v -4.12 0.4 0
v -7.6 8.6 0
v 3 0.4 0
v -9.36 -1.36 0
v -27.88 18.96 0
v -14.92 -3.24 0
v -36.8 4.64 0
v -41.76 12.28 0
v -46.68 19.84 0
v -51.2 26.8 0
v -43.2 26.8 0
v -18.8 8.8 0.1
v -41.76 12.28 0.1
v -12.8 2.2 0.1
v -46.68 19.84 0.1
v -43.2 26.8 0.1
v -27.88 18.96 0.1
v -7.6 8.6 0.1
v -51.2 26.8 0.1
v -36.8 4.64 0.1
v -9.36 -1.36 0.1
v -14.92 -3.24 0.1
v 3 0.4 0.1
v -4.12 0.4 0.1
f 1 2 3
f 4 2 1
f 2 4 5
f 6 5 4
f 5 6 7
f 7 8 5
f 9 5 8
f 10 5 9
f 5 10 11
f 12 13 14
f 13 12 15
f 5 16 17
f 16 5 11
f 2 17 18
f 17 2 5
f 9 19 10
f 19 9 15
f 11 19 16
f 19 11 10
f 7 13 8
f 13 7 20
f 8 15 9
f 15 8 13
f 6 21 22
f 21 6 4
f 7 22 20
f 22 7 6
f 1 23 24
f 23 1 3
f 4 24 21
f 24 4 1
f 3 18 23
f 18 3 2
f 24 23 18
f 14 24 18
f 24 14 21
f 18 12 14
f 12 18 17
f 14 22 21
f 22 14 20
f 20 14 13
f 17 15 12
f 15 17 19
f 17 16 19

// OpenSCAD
// file: 164325d.scad
use <../lib.scad>
function ldraw_lib__164325d() = [
// 0 Sticker  3.8 x  6.8 Tail Plane with Emirates Airlines Logo Left
// 0 Name: 164325d.dat
// 0 Author: Takeshi Takahashi [RainbowDolphin]
// 0 !LDRAW_ORG Part UPDATE 2025-07
// 0 !LICENSE Licensed under CC BY 4.0 : see CAreadme.txt
// 
// 0 BFC CERTIFY CCW
  [0,"BFC","CERTIFY"],
  [0,"BFC","CCW"],
// 
// 0 !KEYWORDS Airliner, Bricklink 1973stk01, Brickowl 949698, Plane
// 0 !KEYWORDS Rebrickable 164325, Set 1973
// 
// 0 !HISTORY 2023-12-31 [OrionP] Official Update 2023-07
// 0 !HISTORY 2025-07-27 [OrionP] Minor header edits
// 0 !HISTORY 2025-07-27 [OrionP] Official Update 2025-07
// 
// 
// 3 16 -7.5 0 1 19 0 21.5 10.3 0 1
  [3,16,-7.5,0,1,19,0,21.5,10.3,0,1],
// 4 16 23.4 0 -3.4 10.3 0 1 19 0 21.5 69.7 0 47.4
  [4,16,23.4,0,-3.4,10.3,0,1,19,0,21.5,69.7,0,47.4],
// 4 16 37.3 0 -8.1 23.4 0 -3.4 69.7 0 47.4 92 0 11.6
  [4,16,37.3,0,-8.1,23.4,0,-3.4,69.7,0,47.4,92,0,11.6],
// 3 16 69.7 0 47.4 104.4 0 30.7 92 0 11.6
  [3,16,69.7,0,47.4,104.4,0,30.7,92,0,11.6],
// 3 16 104.4 0 30.7 69.7 0 47.4 116.7 0 49.6
  [3,16,104.4,0,30.7,69.7,0,47.4,116.7,0,49.6],
// 3 16 116.7 0 49.6 69.7 0 47.4 128 0 67
  [3,16,116.7,0,49.6,69.7,0,47.4,128,0,67],
// 3 16 108 0 67 128 0 67 69.7 0 47.4
  [3,16,108,0,67,128,0,67,69.7,0,47.4],
// 4 16 47 -.25 22 32 -.25 5.5 104.4 -.25 30.7 116.7 -.25 49.6
  [4,16,47,-.25,22,32,-.25,5.5,104.4,-.25,30.7,116.7,-.25,49.6],
// 4 16 108 -.25 67 108 0 67 69.7 0 47.4 69.7 -.25 47.4
  [4,16,108,-.25,67,108,0,67,69.7,0,47.4,69.7,-.25,47.4],
// 4 16 69.7 -.25 47.4 69.7 0 47.4 19 0 21.5 19 -.25 21.5
  [4,16,69.7,-.25,47.4,69.7,0,47.4,19,0,21.5,19,-.25,21.5],
// 4 16 116.7 -.25 49.6 116.7 0 49.6 128 0 67 128 -.25 67
  [4,16,116.7,-.25,49.6,116.7,0,49.6,128,0,67,128,-.25,67],
// 4 16 128 -.25 67 128 0 67 108 0 67 108 -.25 67
  [4,16,128,-.25,67,128,0,67,108,0,67,108,-.25,67],
// 4 16 92 -.25 11.6 92 0 11.6 104.4 0 30.7 104.4 -.25 30.7
  [4,16,92,-.25,11.6,92,0,11.6,104.4,0,30.7,104.4,-.25,30.7],
// 4 16 104.4 -.25 30.7 104.4 0 30.7 116.7 0 49.6 116.7 -.25 49.6
  [4,16,104.4,-.25,30.7,104.4,0,30.7,116.7,0,49.6,116.7,-.25,49.6],
// 4 16 23.4 -.25 -3.4 23.4 0 -3.4 37.3 0 -8.1 37.3 -.25 -8.1
  [4,16,23.4,-.25,-3.4,23.4,0,-3.4,37.3,0,-8.1,37.3,-.25,-8.1],
// 4 16 37.3 -.25 -8.1 37.3 0 -8.1 92 0 11.6 92 -.25 11.6
  [4,16,37.3,-.25,-8.1,37.3,0,-8.1,92,0,11.6,92,-.25,11.6],
// 4 16 -7.5 -.25 1 -7.5 0 1 10.3 0 1 10.3 -.25 1
  [4,16,-7.5,-.25,1,-7.5,0,1,10.3,0,1,10.3,-.25,1],
// 4 16 10.3 -.25 1 10.3 0 1 23.4 0 -3.4 23.4 -.25 -3.4
  [4,16,10.3,-.25,1,10.3,0,1,23.4,0,-3.4,23.4,-.25,-3.4],
// 4 16 19 -.25 21.5 19 0 21.5 -7.5 0 1 -7.5 -.25 1
  [4,16,19,-.25,21.5,19,0,21.5,-7.5,0,1,-7.5,-.25,1],
// 0 BFC NOCLIP
  [0,"BFC","NOCLIP"],
// 3 4 19 -.25 21.5 -7.5 -.25 1 10.3 -.25 1
  [3,4,19,-.25,21.5,-7.5,-.25,1,10.3,-.25,1],
// 4 4 19 -.25 21.5 10.3 -.25 1 23.4 -.25 -3.4 32 -.25 5.5
  [4,4,19,-.25,21.5,10.3,-.25,1,23.4,-.25,-3.4,32,-.25,5.5],
// 4 4 19 -.25 21.5 32 -.25 5.5 47 -.25 22 69.7 -.25 47.4
  [4,4,19,-.25,21.5,32,-.25,5.5,47,-.25,22,69.7,-.25,47.4],
// 4 0 32 -.25 5.5 23.4 -.25 -3.4 37.3 -.25 -8.1 92 -.25 11.6
  [4,0,32,-.25,5.5,23.4,-.25,-3.4,37.3,-.25,-8.1,92,-.25,11.6],
// 3 0 104.4 -.25 30.7 32 -.25 5.5 92 -.25 11.6
  [3,0,104.4,-.25,30.7,32,-.25,5.5,92,-.25,11.6],
// 4 2 69.7 -.25 47.4 47 -.25 22 116.7 -.25 49.6 128 -.25 67
  [4,2,69.7,-.25,47.4,47,-.25,22,116.7,-.25,49.6,128,-.25,67],
// 3 2 128 -.25 67 108 -.25 67 69.7 -.25 47.4
  [3,2,128,-.25,67,108,-.25,67,69.7,-.25,47.4],
// 0 BFC CLIP
  [0,"BFC","CLIP"],
// 5 24 37.3 0 -8.1 37.3 -.25 -8.1 23.4 0 -3.4 92 0 11.6
  [5,24,37.3,0,-8.1,37.3,-.25,-8.1,23.4,0,-3.4,92,0,11.6],
// 5 24 92 0 11.6 92 -.25 11.6 37.3 0 -8.1 104.4 0 30.7
  [5,24,92,0,11.6,92,-.25,11.6,37.3,0,-8.1,104.4,0,30.7],
// 5 24 10.3 0 1 10.3 -.25 1 -7.5 0 1 23.4 0 -3.4
  [5,24,10.3,0,1,10.3,-.25,1,-7.5,0,1,23.4,0,-3.4],
// 5 24 23.4 0 -3.4 23.4 -.25 -3.4 10.3 0 1 37.3 0 -8.1
  [5,24,23.4,0,-3.4,23.4,-.25,-3.4,10.3,0,1,37.3,0,-8.1],
// 5 24 19 0 21.5 19 -.25 21.5 -7.5 0 1 69.7 0 47.4
  [5,24,19,0,21.5,19,-.25,21.5,-7.5,0,1,69.7,0,47.4],
// 5 24 108 0 67 108 -.25 67 128 0 67 69.7 0 47.4
  [5,24,108,0,67,108,-.25,67,128,0,67,69.7,0,47.4],
];
module ldraw_lib__164325d(step=0, col=false, unit=2/5, alt=false, line=0.2, solid=!$preview)
    makepoly(ldraw_lib__164325d(), step=step, col=col, unit=unit, alt=alt, line=line, solid=solid);
ldraw_lib__164325d(line=0.2);
// main file
use <../lib.scad>
use <164325d.scad>
function ldraw_lib__164325b() = [
// 0 Sticker  3.8 x  6.8 Tail Plane with Emirates Airlines Logo Right
// 0 Name: 164325b.dat
// 0 Author: Takeshi Takahashi [RainbowDolphin]
// 0 !LDRAW_ORG Part UPDATE 2025-07
// 0 !LICENSE Licensed under CC BY 4.0 : see CAreadme.txt
// 
// 0 BFC CERTIFY CCW
  [0,"BFC","CERTIFY"],
  [0,"BFC","CCW"],
// 
// 0 !KEYWORDS Airliner, Bricklink 1973stk01, Brickowl 949698, Plane
// 0 !KEYWORDS Rebrickable 164325, Set 1973
// 
// 0 !HISTORY 2023-12-31 [OrionP] Official Update 2023-07
// 0 !HISTORY 2025-07-27 [OrionP] Minor header edits
// 0 !HISTORY 2025-07-27 [OrionP] Official Update 2025-07
// 
// 
// 1 16 0 0 0 -1 0 0 0 1 0 0 0 1 164325d.dat
  [1,16,0,0,0,-1,0,0,0,1,0,0,0,1, ldraw_lib__164325d()],
];
module ldraw_lib__164325b(step=0, col=false, unit=2/5, alt=false, line=0.2, solid=!$preview)
    makepoly(ldraw_lib__164325b(), step=step, col=col, unit=unit, alt=alt, line=line, solid=solid);
ldraw_lib__164325b(line=0.2);
